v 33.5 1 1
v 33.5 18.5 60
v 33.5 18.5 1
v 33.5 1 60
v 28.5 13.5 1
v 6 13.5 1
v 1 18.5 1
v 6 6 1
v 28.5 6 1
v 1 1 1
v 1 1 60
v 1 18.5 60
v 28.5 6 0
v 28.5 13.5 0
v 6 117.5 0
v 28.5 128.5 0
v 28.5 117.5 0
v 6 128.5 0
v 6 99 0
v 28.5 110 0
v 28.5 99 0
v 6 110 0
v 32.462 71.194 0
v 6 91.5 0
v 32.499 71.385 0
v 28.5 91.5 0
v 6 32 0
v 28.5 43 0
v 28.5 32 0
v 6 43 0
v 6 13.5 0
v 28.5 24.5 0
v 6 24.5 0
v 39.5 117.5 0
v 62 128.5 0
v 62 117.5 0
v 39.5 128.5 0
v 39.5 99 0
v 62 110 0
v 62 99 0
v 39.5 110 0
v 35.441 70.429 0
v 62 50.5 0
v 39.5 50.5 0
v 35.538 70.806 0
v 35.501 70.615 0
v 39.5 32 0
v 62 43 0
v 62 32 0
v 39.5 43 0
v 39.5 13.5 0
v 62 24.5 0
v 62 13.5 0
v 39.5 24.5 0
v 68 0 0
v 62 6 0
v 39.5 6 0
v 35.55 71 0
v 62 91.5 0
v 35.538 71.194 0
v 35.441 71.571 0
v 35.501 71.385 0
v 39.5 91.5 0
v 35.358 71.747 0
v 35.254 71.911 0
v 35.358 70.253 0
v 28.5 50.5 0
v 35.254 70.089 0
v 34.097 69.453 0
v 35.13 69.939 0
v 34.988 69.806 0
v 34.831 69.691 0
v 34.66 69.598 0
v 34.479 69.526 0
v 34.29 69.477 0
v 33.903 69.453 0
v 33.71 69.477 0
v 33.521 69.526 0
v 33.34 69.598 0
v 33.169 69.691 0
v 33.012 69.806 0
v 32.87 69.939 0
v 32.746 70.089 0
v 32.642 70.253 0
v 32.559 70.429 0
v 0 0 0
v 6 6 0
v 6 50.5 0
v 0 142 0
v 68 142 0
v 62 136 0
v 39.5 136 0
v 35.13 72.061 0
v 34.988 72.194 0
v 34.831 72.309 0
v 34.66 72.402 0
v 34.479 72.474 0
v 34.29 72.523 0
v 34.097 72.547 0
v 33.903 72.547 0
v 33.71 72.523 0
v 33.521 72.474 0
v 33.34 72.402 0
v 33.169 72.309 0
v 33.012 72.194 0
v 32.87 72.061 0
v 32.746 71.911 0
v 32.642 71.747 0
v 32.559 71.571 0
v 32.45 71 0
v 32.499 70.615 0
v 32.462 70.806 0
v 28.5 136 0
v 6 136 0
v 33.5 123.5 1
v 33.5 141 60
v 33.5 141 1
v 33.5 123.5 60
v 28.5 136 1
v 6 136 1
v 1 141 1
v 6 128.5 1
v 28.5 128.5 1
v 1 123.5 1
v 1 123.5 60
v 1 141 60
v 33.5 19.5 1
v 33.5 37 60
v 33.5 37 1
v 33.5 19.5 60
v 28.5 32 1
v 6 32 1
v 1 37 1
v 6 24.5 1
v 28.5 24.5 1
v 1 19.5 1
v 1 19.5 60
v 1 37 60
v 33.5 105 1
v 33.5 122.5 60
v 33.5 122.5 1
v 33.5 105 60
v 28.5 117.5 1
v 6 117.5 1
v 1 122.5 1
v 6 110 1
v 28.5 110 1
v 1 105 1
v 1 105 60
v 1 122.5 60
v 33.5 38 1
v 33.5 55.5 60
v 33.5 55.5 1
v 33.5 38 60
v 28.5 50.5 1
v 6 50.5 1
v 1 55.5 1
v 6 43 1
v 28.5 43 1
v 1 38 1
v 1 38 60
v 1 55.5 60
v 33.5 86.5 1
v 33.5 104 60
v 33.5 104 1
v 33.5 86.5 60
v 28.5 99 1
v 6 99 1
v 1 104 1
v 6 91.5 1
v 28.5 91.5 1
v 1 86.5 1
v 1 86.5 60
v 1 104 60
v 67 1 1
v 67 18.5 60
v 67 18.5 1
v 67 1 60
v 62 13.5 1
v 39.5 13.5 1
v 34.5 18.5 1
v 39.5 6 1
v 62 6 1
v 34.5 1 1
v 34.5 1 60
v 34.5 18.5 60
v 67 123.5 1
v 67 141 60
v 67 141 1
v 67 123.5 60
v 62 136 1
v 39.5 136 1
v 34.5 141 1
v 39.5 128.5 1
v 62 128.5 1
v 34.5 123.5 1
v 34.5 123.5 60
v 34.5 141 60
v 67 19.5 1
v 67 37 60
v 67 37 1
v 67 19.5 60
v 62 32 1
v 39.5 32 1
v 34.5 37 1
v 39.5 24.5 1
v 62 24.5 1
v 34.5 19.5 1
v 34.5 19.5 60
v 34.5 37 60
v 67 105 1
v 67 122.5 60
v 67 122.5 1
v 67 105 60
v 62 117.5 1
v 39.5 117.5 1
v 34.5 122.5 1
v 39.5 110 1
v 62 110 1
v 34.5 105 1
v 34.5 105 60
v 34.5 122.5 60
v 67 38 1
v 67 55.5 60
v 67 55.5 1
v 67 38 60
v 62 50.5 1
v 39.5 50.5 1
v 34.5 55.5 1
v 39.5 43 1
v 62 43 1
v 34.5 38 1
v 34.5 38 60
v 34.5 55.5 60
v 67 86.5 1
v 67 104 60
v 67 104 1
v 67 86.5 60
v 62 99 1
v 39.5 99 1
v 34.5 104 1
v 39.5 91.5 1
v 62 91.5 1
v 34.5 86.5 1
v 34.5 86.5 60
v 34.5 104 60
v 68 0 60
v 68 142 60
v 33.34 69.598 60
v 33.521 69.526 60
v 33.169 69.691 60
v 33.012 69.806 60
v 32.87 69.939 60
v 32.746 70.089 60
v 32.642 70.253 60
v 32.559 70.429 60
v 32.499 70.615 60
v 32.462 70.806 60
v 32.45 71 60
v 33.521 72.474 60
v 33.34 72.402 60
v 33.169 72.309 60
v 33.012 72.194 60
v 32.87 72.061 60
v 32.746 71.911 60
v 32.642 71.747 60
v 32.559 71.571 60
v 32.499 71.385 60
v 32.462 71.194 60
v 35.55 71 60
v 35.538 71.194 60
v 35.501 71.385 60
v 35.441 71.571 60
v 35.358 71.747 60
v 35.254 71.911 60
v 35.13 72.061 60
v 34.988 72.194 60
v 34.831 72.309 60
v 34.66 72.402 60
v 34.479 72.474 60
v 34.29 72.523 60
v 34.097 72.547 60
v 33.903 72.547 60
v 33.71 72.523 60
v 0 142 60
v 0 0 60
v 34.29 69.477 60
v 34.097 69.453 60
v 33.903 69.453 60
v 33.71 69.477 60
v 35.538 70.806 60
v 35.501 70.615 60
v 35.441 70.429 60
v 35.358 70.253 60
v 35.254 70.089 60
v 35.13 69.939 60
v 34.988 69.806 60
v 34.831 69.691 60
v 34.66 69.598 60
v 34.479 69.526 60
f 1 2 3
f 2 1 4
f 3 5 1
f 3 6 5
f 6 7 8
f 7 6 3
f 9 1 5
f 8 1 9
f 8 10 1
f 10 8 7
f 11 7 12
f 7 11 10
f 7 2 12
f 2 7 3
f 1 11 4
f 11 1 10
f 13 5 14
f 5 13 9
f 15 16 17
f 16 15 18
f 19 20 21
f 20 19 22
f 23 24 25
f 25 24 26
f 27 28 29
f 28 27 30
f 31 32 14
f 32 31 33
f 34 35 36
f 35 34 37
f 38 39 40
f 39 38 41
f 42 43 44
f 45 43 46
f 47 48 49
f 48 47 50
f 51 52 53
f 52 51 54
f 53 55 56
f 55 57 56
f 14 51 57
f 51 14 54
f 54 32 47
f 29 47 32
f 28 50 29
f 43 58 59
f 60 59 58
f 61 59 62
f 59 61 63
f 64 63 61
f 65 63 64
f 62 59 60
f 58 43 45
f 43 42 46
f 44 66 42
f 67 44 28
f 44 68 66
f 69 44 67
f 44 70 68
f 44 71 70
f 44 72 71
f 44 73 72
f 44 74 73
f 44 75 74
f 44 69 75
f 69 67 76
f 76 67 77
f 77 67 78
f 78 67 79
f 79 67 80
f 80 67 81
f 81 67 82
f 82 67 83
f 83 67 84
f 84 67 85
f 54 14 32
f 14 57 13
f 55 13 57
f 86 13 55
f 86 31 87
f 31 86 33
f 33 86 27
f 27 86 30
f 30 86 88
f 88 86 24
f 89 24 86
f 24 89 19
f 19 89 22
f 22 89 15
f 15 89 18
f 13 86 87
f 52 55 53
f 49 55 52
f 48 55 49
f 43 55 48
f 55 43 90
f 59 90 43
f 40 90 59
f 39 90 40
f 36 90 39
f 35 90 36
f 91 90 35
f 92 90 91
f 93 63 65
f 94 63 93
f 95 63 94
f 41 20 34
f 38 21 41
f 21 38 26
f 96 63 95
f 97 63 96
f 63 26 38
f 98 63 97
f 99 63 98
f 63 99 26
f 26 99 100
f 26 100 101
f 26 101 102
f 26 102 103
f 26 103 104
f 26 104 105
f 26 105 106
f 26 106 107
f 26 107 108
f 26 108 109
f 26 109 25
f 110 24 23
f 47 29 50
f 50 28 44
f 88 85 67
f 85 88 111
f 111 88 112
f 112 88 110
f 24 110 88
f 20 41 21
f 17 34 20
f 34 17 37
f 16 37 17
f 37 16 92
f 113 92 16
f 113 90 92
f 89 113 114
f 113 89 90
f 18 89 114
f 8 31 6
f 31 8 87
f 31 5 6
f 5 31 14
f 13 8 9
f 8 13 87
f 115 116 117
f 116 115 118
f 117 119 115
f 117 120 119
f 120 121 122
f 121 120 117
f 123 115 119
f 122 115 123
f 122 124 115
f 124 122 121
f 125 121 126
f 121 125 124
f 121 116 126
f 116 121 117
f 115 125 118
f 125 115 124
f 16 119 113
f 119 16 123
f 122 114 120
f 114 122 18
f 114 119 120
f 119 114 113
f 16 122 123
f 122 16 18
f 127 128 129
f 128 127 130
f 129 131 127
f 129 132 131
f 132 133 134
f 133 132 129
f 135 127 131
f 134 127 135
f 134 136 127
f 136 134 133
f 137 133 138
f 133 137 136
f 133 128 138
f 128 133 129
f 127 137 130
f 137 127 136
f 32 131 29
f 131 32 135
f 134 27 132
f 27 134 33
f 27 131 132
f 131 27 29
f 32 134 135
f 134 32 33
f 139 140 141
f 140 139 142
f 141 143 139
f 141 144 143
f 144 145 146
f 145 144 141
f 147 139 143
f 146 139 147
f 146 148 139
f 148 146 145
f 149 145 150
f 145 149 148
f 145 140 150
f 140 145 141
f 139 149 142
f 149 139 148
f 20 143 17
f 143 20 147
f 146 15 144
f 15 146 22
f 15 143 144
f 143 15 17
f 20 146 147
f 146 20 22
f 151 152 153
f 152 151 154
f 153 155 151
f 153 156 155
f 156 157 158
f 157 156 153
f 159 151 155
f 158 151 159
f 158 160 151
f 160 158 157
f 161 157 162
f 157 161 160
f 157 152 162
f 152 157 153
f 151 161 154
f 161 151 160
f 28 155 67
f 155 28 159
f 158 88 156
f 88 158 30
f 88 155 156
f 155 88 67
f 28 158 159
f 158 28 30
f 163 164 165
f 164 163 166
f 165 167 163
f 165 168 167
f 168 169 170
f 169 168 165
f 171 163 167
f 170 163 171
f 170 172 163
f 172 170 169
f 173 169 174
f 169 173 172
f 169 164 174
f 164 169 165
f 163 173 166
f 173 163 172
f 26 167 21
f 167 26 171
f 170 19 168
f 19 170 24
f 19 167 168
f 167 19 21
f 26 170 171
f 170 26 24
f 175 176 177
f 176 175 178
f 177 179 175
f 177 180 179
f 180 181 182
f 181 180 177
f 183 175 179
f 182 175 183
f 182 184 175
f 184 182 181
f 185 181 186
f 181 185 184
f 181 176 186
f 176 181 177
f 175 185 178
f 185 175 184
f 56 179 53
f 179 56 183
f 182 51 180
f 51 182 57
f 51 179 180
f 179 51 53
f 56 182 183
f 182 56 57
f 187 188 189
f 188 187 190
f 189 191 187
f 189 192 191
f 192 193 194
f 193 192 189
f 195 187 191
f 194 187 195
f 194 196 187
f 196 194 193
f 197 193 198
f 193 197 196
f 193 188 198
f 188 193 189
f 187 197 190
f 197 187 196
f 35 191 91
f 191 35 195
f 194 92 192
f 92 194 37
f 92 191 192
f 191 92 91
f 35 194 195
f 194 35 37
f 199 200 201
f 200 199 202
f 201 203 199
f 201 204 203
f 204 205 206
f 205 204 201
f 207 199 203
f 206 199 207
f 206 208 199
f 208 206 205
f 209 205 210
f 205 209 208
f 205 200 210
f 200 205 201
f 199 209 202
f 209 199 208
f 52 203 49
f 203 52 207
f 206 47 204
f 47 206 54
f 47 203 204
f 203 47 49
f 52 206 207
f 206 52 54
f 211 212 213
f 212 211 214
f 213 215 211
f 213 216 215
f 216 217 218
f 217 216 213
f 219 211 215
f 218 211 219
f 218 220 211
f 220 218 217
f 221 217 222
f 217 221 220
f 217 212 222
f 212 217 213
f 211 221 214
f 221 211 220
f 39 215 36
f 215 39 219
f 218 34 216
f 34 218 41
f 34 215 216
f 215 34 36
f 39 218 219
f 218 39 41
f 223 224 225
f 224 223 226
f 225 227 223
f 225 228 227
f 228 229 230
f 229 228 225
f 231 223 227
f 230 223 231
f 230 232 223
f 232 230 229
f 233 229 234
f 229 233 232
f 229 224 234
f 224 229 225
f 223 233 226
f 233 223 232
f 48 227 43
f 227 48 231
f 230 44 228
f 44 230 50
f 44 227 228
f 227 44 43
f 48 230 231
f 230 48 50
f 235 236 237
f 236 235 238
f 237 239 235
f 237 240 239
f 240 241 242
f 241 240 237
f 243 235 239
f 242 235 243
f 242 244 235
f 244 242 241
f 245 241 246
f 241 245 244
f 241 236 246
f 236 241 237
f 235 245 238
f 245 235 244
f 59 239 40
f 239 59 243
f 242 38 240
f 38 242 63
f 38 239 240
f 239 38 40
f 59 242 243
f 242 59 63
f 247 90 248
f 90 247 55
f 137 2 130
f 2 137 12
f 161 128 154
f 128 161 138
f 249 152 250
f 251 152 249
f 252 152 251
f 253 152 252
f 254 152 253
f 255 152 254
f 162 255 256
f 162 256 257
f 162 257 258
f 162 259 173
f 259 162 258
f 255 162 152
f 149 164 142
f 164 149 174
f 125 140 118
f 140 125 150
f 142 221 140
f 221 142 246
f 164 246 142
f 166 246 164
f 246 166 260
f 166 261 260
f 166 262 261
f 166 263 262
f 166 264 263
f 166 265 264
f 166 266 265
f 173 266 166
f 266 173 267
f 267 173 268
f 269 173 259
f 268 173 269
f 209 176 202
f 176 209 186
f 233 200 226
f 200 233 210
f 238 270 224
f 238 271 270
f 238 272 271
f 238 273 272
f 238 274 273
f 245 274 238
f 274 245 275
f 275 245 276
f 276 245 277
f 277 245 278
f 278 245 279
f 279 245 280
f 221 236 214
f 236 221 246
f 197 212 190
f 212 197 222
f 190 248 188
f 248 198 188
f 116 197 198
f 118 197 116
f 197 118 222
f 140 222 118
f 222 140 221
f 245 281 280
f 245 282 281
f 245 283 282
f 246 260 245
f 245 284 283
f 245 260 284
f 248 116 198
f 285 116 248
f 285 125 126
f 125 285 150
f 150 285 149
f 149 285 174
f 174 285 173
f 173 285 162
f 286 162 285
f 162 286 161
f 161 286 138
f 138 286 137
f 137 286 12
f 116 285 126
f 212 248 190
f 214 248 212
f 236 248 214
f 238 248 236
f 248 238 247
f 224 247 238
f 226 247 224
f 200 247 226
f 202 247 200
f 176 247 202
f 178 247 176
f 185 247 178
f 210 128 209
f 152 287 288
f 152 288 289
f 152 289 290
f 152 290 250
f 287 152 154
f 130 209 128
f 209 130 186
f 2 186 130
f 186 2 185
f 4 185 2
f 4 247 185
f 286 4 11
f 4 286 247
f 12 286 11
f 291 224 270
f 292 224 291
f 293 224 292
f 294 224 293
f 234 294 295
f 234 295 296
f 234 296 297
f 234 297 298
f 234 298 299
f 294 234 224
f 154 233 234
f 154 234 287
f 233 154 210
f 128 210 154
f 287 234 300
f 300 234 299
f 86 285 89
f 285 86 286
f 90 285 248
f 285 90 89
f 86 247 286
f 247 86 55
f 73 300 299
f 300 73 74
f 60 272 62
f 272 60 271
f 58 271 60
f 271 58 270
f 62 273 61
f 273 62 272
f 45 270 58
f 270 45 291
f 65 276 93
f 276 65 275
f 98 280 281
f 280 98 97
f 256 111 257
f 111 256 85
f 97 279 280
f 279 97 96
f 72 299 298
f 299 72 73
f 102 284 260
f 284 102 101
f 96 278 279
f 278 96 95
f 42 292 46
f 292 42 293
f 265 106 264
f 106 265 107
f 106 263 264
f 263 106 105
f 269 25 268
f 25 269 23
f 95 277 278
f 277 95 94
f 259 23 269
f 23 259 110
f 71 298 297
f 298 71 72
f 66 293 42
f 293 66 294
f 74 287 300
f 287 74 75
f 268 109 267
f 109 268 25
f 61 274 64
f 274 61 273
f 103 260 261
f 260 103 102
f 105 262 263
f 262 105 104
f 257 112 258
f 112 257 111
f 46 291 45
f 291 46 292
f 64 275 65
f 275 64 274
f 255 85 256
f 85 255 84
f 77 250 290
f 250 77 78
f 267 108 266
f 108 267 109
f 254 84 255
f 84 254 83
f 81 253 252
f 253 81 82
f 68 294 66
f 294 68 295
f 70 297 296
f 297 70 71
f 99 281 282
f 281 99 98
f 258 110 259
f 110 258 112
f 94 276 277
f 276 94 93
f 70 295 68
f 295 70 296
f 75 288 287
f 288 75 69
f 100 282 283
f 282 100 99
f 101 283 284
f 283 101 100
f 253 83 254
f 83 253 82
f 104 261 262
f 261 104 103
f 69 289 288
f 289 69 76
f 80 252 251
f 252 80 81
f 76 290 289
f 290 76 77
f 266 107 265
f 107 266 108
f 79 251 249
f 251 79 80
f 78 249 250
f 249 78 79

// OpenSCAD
// battery holder for 50mm ammo can

$fn=50;
//ammo can inside dimensions.  long side is x axis.
can_x = 281;
can_y = 144;
can_z = 173;
can_gap = 1;    // leave this gap between the box and can walls

wall=1;         // thickness of wall being printed
floor = wall;   // thickness of floor being printed

// internal maximum box
box_max_x = can_x - 2 * can_gap;
box_max_y = can_y - 2 * can_gap;
box_max_z = can_z;

INCH=25.4;
//THREAD=1/4*INCH-.2;
THREAD=3.1;           // #6-32


module column(xoffset,ny, batx, baty, batz, cubey) {
    border=5;
    for (c=[0:ny/2-1]) {
        translate([xoffset,wall+c*baty+c,wall]) {
            cube([batx,baty,batz]);
            translate([border,border,-wall])
                cube([batx-2*border,baty-2*border,batz]);
        }
        translate([xoffset,cubey-wall-baty*(c+1)-c,wall]) {
            cube([batx,baty,batz]);
            translate([border,border,-wall])
                cube([batx-2*border,baty-2*border,batz]);
        }
    }
    if (ny%2 == 1) {
        translate([xoffset,wall+cubey/2-baty/2,wall]) {
            cube([batx,baty,batz]);
            translate([border,border,-wall])
                cube([batx-2*border,baty-2*border,batz]);
        }
    }
}

module b0(t,nx, ny, batx, baty, cubex=-1, cubey=box_max_y, cubez=30) {
    cubex = (cubex==-1) ? wall+nx*(wall+batx) : cubex;
    difference() {
        union() {
            b1(nx, ny, batx, baty, cubex, cubey, cubez);
            translate([cubex/2,cubey/2,0]) cylinder(h=cubez,d=THREAD*1.5);
        }
        translate([cubex/2,cubey/2,0])cylinder(h=cubez,d=THREAD);
    }
}

module b1(nx, ny, batx, baty, cubex=-1, cubey=box_max_y, cubez=30) {
    difference() {
        cube([cubex,cubey,cubez]);
        for (r=[0:nx-1]) {
            xoffset=wall+r*batx+r;
            column(xoffset,ny,batx, baty, cubez, cubey);
        }
    }
}

//b0("2s300",1,8,17,13.5,cubez=35);  //fatter
//b0("2s300",1,8,16.5,13.3,cubez=50);
//b0("2s300",2,9,20.5,13.5);
b0("3s500",2,6,32.5,17.5,cubez=60);
//b0("3s1300",2,4,36,29,cubez=60);
//b0("4s1000",1,4,35,30,cubez=60);
//b0("4s1300",1,4,36,32,cubez=60);
//b0("4s1800",1,4,36,34,cubez=60);
//b0("4s3000",1,4,44,35,cubez=60);
//b0("4s3000",2,3,35,44,cubez=60);
